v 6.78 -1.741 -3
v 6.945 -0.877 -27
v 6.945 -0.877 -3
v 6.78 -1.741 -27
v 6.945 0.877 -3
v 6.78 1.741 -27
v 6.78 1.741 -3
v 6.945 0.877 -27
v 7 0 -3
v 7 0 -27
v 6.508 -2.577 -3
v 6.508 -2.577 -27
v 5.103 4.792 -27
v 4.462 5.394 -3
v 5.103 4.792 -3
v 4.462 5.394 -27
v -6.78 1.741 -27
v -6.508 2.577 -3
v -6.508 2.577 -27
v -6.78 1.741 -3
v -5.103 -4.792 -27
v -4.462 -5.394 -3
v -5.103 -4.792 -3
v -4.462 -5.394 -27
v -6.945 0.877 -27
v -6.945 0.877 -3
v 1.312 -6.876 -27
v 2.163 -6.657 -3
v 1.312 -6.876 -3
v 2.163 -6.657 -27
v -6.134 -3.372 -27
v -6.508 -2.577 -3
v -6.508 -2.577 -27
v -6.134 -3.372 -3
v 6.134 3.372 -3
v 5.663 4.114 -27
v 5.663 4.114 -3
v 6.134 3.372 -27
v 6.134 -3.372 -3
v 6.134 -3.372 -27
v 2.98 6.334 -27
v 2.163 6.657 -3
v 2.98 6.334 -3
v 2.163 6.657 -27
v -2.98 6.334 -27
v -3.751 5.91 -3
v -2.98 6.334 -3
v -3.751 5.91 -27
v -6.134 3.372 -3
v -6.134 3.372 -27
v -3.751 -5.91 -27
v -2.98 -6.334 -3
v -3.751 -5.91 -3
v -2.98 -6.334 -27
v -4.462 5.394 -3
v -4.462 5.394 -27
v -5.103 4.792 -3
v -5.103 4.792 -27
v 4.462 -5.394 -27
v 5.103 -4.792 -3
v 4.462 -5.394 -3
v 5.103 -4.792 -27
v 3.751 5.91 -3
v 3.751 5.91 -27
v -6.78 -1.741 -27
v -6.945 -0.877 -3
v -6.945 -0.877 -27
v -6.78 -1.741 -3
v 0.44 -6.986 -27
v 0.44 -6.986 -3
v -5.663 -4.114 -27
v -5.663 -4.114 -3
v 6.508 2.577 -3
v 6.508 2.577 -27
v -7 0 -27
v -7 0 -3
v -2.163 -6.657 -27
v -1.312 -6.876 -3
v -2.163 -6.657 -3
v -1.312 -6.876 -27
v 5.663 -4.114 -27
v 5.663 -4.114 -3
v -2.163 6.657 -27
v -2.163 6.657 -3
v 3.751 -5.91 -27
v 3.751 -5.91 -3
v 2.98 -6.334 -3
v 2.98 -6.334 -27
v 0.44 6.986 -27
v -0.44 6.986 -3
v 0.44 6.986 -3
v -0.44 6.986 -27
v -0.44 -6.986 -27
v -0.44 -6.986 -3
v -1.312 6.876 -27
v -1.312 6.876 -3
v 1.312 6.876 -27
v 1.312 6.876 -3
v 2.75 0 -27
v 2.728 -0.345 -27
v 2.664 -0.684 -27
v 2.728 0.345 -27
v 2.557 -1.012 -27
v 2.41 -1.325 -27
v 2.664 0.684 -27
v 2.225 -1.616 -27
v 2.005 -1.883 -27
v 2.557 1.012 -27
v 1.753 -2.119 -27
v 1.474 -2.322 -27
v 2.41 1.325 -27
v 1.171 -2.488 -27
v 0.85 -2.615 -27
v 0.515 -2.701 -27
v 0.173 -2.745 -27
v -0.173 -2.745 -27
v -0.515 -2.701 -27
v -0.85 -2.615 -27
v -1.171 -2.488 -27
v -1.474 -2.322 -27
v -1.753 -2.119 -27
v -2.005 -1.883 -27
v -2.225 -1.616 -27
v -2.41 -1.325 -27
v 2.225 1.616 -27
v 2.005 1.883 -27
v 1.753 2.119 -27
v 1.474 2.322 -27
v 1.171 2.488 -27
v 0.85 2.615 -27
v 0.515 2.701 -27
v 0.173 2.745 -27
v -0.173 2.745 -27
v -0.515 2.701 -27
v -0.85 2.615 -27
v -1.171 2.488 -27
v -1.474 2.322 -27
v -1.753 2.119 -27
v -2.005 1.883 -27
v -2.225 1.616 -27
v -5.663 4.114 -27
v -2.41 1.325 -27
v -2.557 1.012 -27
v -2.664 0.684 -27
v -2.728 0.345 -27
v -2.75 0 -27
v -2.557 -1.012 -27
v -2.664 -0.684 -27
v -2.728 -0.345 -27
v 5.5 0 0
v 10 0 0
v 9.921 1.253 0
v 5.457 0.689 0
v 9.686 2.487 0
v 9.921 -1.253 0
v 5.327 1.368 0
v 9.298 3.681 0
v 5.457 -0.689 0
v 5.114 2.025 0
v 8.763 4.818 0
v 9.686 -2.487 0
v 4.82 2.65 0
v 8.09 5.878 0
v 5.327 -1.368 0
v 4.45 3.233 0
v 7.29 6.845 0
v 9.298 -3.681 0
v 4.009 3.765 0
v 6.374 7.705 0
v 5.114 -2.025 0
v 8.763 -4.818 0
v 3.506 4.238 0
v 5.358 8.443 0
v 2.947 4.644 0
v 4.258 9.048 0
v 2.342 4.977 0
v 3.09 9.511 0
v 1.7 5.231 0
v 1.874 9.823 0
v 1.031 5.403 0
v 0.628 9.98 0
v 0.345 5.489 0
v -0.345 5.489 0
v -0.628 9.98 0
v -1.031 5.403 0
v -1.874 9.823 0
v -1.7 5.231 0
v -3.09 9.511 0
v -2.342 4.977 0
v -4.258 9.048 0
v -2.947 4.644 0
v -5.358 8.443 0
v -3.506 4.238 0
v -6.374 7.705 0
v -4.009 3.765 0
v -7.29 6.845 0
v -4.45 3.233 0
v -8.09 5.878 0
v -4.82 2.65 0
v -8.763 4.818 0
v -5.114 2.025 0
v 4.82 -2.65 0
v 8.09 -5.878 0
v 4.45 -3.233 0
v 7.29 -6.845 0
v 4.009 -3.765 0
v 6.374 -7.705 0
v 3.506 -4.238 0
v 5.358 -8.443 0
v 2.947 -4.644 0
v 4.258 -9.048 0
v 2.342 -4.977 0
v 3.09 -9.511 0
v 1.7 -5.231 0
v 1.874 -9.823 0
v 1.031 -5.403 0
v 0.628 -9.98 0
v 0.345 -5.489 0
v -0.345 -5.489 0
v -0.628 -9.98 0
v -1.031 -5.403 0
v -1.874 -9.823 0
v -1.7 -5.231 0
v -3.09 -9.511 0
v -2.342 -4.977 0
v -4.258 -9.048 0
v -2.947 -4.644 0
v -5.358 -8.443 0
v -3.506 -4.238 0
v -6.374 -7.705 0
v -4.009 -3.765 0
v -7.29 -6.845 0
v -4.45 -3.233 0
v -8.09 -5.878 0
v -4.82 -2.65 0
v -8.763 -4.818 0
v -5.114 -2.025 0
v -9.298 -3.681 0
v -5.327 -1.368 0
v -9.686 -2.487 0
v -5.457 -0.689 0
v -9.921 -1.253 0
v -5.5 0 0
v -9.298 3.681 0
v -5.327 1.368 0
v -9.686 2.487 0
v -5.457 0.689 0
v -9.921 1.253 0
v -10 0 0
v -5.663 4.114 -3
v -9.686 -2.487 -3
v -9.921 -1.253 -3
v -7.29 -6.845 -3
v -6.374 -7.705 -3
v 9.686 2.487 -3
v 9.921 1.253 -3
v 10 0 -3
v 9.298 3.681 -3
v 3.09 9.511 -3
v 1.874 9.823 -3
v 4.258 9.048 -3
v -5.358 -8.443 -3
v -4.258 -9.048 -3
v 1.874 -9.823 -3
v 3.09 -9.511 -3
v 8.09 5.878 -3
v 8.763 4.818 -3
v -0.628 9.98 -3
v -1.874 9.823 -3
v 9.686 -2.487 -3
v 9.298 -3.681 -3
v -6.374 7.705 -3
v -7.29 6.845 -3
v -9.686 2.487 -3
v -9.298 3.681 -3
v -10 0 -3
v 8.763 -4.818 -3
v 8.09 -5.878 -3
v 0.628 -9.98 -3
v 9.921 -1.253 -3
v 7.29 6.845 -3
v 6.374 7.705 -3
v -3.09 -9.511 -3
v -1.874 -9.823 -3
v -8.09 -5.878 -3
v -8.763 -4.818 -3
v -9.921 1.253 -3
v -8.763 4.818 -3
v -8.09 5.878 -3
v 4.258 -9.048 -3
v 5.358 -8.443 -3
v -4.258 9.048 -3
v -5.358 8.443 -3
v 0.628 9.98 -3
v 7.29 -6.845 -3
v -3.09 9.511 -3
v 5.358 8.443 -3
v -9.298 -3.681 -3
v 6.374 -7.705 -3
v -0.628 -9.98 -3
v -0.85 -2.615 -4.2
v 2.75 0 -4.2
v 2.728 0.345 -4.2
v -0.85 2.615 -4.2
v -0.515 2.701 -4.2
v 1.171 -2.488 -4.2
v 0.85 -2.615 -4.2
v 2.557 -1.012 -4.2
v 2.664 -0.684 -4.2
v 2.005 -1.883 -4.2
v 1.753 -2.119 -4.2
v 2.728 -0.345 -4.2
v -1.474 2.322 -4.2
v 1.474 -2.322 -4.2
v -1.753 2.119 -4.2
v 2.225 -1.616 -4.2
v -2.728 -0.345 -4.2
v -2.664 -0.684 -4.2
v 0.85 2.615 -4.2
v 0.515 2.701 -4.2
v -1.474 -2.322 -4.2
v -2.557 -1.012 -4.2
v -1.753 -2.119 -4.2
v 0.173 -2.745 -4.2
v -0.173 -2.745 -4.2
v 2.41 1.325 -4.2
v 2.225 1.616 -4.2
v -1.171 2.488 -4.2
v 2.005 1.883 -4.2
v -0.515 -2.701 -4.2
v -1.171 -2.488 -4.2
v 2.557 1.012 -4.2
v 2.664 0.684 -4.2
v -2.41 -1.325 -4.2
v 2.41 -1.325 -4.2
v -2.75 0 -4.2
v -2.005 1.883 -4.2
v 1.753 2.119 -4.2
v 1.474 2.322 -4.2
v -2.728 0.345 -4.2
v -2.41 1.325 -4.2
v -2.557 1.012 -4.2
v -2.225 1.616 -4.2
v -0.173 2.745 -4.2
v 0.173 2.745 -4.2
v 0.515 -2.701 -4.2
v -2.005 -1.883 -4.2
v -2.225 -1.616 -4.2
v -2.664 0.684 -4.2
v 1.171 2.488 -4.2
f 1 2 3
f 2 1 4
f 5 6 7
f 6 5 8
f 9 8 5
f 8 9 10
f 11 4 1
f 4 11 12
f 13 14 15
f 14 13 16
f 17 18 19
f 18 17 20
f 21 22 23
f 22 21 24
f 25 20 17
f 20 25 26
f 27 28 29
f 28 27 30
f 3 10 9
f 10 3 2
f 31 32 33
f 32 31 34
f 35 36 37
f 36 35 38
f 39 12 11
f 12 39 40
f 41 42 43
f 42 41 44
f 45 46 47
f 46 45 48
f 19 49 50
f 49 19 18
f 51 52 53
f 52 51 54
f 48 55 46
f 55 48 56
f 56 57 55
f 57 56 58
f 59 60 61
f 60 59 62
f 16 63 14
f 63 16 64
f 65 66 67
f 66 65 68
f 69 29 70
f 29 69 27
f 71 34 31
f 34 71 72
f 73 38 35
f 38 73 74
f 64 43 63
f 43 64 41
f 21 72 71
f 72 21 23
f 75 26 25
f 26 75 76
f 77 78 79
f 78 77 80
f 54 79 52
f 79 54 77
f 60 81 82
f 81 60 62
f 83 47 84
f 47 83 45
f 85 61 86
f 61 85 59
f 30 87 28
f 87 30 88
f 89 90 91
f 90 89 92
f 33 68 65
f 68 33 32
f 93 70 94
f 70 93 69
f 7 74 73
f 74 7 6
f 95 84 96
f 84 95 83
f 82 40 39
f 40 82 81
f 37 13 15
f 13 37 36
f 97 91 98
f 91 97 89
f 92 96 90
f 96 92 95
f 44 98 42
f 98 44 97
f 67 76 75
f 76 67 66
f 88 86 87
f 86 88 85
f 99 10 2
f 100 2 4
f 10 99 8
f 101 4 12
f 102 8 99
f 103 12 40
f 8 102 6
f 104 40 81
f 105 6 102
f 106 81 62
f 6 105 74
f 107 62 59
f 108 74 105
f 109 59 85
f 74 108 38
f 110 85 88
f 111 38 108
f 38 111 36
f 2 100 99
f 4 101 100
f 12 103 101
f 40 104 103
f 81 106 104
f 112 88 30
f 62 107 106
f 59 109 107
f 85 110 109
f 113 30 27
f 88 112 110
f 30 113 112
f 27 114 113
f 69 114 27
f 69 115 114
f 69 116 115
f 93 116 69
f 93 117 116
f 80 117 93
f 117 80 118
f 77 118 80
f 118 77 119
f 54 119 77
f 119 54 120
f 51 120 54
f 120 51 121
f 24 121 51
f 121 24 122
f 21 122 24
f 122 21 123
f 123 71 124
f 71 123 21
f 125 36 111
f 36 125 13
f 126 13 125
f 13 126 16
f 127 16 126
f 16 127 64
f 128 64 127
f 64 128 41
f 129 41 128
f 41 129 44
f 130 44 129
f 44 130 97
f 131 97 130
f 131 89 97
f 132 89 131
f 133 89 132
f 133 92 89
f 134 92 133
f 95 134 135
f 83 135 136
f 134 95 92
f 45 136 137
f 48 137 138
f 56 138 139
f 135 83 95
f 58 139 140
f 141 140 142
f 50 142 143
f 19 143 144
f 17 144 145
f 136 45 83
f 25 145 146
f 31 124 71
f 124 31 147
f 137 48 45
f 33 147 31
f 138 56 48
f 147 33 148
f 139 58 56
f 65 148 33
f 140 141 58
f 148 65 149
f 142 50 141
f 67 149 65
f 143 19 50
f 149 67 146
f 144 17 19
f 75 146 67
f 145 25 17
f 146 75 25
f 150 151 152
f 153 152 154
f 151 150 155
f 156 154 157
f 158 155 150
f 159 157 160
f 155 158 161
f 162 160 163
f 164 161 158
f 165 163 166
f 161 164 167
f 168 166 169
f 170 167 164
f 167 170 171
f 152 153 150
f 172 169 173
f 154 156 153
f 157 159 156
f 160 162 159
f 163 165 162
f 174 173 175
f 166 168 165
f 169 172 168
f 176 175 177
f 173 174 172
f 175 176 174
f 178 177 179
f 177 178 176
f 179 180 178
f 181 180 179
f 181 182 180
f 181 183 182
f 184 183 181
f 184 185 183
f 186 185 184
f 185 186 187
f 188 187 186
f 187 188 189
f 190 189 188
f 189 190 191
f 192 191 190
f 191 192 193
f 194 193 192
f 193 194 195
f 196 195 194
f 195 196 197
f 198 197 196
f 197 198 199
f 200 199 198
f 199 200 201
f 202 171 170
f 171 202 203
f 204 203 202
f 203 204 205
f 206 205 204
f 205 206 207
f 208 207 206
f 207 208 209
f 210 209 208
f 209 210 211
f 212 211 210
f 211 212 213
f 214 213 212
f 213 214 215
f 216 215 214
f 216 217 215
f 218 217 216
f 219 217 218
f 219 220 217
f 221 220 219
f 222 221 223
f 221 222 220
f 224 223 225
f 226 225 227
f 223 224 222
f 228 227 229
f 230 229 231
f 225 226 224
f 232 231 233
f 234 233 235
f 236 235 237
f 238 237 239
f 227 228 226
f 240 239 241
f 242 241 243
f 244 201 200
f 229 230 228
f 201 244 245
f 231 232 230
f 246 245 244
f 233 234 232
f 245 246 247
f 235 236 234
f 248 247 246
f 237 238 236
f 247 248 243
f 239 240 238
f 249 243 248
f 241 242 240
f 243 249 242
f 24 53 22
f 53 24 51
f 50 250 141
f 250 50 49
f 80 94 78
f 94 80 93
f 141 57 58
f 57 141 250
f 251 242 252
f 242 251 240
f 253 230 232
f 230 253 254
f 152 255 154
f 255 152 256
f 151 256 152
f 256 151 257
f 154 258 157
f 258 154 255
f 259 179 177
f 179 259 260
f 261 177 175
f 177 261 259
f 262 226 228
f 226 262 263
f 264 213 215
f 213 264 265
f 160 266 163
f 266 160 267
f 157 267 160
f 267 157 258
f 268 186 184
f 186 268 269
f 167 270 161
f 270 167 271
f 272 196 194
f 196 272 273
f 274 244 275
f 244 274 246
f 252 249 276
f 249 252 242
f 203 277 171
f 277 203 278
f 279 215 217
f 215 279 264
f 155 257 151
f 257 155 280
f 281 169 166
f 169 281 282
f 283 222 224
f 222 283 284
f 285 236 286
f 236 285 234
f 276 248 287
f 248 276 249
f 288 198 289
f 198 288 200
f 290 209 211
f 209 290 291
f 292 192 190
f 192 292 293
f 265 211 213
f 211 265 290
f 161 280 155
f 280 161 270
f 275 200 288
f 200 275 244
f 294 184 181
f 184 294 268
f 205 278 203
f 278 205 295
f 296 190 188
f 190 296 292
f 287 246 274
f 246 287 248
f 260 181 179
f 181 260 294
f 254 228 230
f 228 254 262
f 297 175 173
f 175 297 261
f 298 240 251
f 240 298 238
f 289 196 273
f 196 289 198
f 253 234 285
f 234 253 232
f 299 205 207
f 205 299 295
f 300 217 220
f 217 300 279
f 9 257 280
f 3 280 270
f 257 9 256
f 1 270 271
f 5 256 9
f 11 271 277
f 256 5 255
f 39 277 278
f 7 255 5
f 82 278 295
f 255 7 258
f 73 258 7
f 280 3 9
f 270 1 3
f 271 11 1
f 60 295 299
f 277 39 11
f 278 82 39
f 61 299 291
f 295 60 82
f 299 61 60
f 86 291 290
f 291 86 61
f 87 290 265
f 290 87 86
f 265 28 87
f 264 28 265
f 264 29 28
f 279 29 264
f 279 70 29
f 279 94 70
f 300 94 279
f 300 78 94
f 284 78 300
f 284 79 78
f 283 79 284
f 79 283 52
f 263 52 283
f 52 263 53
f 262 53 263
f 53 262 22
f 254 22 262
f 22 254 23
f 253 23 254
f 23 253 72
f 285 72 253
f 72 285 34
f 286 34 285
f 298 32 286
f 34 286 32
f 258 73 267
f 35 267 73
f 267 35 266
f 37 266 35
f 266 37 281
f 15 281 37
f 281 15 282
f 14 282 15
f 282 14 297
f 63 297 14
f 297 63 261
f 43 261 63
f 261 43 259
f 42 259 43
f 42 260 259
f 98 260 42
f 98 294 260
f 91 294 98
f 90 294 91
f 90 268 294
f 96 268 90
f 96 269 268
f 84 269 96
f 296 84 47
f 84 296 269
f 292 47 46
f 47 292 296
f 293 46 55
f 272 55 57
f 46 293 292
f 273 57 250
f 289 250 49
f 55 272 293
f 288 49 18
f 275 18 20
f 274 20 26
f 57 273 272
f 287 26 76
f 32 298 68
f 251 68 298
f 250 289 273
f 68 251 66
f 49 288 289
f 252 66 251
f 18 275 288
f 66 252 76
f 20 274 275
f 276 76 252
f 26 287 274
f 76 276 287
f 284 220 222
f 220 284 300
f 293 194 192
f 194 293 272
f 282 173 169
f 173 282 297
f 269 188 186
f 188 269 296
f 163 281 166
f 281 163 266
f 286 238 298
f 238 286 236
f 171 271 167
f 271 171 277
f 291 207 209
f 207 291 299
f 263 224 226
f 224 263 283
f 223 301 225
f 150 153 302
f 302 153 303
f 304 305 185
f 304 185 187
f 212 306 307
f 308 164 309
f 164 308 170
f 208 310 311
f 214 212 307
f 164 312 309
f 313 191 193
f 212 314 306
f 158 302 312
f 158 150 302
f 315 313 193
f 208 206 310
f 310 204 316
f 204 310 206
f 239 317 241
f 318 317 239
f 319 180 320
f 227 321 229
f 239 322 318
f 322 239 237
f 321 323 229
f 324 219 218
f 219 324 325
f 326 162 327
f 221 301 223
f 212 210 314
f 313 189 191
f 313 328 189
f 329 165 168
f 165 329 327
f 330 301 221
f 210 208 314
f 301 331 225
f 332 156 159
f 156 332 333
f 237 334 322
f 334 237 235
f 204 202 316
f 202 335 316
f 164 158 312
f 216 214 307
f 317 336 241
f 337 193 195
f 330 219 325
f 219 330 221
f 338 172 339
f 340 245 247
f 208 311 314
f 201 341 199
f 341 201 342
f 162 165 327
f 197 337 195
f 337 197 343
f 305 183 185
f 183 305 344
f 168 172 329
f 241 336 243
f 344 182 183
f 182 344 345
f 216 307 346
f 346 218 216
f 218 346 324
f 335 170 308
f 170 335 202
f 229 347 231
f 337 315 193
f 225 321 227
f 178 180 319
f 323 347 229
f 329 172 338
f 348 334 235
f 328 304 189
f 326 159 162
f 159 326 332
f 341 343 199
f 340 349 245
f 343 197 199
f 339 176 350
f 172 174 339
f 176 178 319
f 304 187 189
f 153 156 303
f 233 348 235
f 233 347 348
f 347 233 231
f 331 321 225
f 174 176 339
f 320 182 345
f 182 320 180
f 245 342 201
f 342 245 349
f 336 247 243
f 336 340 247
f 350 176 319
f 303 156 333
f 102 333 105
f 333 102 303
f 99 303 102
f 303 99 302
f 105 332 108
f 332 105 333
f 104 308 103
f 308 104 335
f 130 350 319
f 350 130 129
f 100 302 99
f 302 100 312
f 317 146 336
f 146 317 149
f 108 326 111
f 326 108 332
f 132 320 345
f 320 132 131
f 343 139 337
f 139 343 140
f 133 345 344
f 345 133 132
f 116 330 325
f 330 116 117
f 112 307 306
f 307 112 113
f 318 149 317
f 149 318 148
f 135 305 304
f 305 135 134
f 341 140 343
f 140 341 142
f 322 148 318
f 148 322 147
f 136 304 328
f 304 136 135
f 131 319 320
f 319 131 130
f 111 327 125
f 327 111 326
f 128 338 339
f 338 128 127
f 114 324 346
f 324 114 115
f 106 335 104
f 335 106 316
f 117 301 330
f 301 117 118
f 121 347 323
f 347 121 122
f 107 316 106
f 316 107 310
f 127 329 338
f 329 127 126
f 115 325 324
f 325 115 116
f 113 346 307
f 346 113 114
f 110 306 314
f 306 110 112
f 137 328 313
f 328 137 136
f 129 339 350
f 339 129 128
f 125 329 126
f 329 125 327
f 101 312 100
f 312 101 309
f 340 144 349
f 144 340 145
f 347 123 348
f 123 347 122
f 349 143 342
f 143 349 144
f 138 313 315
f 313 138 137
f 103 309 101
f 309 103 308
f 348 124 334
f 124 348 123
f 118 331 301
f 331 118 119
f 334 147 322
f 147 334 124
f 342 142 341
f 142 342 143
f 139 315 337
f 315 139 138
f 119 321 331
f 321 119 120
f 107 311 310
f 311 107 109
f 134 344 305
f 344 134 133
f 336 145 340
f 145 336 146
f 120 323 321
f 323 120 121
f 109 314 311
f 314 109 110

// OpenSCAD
$fn = 50;


difference() {
	union() {
		translate(v = [0, 0, -27.0000000000]) {
			cylinder(h = 27, r = 7.0000000000);
		}
		translate(v = [0, 0, -3.0000000000]) {
			cylinder(h = 3, r = 10.0000000000);
		}
	}
	union() {
		translate(v = [0, 0, 0]) {
			rotate(a = [0, 0, 0]) {
				difference() {
					union() {
						#translate(v = [0, 0, -27.0000000000]) {
							cylinder(h = 27, r = 2.2500000000);
						}
						#translate(v = [0, 0, -4.2000000000]) {
							cylinder(h = 4.2000000000, r1 = 2.7500000000, r2 = 5.5000000000);
						}
						#translate(v = [0, 0, -27.0000000000]) {
							cylinder(h = 27, r = 2.7500000000);
						}
						#translate(v = [0, 0, -27.0000000000]) {
							cylinder(h = 27, r = 2.2500000000);
						}
					}
					union();
				}
			}
		}
	}
}
